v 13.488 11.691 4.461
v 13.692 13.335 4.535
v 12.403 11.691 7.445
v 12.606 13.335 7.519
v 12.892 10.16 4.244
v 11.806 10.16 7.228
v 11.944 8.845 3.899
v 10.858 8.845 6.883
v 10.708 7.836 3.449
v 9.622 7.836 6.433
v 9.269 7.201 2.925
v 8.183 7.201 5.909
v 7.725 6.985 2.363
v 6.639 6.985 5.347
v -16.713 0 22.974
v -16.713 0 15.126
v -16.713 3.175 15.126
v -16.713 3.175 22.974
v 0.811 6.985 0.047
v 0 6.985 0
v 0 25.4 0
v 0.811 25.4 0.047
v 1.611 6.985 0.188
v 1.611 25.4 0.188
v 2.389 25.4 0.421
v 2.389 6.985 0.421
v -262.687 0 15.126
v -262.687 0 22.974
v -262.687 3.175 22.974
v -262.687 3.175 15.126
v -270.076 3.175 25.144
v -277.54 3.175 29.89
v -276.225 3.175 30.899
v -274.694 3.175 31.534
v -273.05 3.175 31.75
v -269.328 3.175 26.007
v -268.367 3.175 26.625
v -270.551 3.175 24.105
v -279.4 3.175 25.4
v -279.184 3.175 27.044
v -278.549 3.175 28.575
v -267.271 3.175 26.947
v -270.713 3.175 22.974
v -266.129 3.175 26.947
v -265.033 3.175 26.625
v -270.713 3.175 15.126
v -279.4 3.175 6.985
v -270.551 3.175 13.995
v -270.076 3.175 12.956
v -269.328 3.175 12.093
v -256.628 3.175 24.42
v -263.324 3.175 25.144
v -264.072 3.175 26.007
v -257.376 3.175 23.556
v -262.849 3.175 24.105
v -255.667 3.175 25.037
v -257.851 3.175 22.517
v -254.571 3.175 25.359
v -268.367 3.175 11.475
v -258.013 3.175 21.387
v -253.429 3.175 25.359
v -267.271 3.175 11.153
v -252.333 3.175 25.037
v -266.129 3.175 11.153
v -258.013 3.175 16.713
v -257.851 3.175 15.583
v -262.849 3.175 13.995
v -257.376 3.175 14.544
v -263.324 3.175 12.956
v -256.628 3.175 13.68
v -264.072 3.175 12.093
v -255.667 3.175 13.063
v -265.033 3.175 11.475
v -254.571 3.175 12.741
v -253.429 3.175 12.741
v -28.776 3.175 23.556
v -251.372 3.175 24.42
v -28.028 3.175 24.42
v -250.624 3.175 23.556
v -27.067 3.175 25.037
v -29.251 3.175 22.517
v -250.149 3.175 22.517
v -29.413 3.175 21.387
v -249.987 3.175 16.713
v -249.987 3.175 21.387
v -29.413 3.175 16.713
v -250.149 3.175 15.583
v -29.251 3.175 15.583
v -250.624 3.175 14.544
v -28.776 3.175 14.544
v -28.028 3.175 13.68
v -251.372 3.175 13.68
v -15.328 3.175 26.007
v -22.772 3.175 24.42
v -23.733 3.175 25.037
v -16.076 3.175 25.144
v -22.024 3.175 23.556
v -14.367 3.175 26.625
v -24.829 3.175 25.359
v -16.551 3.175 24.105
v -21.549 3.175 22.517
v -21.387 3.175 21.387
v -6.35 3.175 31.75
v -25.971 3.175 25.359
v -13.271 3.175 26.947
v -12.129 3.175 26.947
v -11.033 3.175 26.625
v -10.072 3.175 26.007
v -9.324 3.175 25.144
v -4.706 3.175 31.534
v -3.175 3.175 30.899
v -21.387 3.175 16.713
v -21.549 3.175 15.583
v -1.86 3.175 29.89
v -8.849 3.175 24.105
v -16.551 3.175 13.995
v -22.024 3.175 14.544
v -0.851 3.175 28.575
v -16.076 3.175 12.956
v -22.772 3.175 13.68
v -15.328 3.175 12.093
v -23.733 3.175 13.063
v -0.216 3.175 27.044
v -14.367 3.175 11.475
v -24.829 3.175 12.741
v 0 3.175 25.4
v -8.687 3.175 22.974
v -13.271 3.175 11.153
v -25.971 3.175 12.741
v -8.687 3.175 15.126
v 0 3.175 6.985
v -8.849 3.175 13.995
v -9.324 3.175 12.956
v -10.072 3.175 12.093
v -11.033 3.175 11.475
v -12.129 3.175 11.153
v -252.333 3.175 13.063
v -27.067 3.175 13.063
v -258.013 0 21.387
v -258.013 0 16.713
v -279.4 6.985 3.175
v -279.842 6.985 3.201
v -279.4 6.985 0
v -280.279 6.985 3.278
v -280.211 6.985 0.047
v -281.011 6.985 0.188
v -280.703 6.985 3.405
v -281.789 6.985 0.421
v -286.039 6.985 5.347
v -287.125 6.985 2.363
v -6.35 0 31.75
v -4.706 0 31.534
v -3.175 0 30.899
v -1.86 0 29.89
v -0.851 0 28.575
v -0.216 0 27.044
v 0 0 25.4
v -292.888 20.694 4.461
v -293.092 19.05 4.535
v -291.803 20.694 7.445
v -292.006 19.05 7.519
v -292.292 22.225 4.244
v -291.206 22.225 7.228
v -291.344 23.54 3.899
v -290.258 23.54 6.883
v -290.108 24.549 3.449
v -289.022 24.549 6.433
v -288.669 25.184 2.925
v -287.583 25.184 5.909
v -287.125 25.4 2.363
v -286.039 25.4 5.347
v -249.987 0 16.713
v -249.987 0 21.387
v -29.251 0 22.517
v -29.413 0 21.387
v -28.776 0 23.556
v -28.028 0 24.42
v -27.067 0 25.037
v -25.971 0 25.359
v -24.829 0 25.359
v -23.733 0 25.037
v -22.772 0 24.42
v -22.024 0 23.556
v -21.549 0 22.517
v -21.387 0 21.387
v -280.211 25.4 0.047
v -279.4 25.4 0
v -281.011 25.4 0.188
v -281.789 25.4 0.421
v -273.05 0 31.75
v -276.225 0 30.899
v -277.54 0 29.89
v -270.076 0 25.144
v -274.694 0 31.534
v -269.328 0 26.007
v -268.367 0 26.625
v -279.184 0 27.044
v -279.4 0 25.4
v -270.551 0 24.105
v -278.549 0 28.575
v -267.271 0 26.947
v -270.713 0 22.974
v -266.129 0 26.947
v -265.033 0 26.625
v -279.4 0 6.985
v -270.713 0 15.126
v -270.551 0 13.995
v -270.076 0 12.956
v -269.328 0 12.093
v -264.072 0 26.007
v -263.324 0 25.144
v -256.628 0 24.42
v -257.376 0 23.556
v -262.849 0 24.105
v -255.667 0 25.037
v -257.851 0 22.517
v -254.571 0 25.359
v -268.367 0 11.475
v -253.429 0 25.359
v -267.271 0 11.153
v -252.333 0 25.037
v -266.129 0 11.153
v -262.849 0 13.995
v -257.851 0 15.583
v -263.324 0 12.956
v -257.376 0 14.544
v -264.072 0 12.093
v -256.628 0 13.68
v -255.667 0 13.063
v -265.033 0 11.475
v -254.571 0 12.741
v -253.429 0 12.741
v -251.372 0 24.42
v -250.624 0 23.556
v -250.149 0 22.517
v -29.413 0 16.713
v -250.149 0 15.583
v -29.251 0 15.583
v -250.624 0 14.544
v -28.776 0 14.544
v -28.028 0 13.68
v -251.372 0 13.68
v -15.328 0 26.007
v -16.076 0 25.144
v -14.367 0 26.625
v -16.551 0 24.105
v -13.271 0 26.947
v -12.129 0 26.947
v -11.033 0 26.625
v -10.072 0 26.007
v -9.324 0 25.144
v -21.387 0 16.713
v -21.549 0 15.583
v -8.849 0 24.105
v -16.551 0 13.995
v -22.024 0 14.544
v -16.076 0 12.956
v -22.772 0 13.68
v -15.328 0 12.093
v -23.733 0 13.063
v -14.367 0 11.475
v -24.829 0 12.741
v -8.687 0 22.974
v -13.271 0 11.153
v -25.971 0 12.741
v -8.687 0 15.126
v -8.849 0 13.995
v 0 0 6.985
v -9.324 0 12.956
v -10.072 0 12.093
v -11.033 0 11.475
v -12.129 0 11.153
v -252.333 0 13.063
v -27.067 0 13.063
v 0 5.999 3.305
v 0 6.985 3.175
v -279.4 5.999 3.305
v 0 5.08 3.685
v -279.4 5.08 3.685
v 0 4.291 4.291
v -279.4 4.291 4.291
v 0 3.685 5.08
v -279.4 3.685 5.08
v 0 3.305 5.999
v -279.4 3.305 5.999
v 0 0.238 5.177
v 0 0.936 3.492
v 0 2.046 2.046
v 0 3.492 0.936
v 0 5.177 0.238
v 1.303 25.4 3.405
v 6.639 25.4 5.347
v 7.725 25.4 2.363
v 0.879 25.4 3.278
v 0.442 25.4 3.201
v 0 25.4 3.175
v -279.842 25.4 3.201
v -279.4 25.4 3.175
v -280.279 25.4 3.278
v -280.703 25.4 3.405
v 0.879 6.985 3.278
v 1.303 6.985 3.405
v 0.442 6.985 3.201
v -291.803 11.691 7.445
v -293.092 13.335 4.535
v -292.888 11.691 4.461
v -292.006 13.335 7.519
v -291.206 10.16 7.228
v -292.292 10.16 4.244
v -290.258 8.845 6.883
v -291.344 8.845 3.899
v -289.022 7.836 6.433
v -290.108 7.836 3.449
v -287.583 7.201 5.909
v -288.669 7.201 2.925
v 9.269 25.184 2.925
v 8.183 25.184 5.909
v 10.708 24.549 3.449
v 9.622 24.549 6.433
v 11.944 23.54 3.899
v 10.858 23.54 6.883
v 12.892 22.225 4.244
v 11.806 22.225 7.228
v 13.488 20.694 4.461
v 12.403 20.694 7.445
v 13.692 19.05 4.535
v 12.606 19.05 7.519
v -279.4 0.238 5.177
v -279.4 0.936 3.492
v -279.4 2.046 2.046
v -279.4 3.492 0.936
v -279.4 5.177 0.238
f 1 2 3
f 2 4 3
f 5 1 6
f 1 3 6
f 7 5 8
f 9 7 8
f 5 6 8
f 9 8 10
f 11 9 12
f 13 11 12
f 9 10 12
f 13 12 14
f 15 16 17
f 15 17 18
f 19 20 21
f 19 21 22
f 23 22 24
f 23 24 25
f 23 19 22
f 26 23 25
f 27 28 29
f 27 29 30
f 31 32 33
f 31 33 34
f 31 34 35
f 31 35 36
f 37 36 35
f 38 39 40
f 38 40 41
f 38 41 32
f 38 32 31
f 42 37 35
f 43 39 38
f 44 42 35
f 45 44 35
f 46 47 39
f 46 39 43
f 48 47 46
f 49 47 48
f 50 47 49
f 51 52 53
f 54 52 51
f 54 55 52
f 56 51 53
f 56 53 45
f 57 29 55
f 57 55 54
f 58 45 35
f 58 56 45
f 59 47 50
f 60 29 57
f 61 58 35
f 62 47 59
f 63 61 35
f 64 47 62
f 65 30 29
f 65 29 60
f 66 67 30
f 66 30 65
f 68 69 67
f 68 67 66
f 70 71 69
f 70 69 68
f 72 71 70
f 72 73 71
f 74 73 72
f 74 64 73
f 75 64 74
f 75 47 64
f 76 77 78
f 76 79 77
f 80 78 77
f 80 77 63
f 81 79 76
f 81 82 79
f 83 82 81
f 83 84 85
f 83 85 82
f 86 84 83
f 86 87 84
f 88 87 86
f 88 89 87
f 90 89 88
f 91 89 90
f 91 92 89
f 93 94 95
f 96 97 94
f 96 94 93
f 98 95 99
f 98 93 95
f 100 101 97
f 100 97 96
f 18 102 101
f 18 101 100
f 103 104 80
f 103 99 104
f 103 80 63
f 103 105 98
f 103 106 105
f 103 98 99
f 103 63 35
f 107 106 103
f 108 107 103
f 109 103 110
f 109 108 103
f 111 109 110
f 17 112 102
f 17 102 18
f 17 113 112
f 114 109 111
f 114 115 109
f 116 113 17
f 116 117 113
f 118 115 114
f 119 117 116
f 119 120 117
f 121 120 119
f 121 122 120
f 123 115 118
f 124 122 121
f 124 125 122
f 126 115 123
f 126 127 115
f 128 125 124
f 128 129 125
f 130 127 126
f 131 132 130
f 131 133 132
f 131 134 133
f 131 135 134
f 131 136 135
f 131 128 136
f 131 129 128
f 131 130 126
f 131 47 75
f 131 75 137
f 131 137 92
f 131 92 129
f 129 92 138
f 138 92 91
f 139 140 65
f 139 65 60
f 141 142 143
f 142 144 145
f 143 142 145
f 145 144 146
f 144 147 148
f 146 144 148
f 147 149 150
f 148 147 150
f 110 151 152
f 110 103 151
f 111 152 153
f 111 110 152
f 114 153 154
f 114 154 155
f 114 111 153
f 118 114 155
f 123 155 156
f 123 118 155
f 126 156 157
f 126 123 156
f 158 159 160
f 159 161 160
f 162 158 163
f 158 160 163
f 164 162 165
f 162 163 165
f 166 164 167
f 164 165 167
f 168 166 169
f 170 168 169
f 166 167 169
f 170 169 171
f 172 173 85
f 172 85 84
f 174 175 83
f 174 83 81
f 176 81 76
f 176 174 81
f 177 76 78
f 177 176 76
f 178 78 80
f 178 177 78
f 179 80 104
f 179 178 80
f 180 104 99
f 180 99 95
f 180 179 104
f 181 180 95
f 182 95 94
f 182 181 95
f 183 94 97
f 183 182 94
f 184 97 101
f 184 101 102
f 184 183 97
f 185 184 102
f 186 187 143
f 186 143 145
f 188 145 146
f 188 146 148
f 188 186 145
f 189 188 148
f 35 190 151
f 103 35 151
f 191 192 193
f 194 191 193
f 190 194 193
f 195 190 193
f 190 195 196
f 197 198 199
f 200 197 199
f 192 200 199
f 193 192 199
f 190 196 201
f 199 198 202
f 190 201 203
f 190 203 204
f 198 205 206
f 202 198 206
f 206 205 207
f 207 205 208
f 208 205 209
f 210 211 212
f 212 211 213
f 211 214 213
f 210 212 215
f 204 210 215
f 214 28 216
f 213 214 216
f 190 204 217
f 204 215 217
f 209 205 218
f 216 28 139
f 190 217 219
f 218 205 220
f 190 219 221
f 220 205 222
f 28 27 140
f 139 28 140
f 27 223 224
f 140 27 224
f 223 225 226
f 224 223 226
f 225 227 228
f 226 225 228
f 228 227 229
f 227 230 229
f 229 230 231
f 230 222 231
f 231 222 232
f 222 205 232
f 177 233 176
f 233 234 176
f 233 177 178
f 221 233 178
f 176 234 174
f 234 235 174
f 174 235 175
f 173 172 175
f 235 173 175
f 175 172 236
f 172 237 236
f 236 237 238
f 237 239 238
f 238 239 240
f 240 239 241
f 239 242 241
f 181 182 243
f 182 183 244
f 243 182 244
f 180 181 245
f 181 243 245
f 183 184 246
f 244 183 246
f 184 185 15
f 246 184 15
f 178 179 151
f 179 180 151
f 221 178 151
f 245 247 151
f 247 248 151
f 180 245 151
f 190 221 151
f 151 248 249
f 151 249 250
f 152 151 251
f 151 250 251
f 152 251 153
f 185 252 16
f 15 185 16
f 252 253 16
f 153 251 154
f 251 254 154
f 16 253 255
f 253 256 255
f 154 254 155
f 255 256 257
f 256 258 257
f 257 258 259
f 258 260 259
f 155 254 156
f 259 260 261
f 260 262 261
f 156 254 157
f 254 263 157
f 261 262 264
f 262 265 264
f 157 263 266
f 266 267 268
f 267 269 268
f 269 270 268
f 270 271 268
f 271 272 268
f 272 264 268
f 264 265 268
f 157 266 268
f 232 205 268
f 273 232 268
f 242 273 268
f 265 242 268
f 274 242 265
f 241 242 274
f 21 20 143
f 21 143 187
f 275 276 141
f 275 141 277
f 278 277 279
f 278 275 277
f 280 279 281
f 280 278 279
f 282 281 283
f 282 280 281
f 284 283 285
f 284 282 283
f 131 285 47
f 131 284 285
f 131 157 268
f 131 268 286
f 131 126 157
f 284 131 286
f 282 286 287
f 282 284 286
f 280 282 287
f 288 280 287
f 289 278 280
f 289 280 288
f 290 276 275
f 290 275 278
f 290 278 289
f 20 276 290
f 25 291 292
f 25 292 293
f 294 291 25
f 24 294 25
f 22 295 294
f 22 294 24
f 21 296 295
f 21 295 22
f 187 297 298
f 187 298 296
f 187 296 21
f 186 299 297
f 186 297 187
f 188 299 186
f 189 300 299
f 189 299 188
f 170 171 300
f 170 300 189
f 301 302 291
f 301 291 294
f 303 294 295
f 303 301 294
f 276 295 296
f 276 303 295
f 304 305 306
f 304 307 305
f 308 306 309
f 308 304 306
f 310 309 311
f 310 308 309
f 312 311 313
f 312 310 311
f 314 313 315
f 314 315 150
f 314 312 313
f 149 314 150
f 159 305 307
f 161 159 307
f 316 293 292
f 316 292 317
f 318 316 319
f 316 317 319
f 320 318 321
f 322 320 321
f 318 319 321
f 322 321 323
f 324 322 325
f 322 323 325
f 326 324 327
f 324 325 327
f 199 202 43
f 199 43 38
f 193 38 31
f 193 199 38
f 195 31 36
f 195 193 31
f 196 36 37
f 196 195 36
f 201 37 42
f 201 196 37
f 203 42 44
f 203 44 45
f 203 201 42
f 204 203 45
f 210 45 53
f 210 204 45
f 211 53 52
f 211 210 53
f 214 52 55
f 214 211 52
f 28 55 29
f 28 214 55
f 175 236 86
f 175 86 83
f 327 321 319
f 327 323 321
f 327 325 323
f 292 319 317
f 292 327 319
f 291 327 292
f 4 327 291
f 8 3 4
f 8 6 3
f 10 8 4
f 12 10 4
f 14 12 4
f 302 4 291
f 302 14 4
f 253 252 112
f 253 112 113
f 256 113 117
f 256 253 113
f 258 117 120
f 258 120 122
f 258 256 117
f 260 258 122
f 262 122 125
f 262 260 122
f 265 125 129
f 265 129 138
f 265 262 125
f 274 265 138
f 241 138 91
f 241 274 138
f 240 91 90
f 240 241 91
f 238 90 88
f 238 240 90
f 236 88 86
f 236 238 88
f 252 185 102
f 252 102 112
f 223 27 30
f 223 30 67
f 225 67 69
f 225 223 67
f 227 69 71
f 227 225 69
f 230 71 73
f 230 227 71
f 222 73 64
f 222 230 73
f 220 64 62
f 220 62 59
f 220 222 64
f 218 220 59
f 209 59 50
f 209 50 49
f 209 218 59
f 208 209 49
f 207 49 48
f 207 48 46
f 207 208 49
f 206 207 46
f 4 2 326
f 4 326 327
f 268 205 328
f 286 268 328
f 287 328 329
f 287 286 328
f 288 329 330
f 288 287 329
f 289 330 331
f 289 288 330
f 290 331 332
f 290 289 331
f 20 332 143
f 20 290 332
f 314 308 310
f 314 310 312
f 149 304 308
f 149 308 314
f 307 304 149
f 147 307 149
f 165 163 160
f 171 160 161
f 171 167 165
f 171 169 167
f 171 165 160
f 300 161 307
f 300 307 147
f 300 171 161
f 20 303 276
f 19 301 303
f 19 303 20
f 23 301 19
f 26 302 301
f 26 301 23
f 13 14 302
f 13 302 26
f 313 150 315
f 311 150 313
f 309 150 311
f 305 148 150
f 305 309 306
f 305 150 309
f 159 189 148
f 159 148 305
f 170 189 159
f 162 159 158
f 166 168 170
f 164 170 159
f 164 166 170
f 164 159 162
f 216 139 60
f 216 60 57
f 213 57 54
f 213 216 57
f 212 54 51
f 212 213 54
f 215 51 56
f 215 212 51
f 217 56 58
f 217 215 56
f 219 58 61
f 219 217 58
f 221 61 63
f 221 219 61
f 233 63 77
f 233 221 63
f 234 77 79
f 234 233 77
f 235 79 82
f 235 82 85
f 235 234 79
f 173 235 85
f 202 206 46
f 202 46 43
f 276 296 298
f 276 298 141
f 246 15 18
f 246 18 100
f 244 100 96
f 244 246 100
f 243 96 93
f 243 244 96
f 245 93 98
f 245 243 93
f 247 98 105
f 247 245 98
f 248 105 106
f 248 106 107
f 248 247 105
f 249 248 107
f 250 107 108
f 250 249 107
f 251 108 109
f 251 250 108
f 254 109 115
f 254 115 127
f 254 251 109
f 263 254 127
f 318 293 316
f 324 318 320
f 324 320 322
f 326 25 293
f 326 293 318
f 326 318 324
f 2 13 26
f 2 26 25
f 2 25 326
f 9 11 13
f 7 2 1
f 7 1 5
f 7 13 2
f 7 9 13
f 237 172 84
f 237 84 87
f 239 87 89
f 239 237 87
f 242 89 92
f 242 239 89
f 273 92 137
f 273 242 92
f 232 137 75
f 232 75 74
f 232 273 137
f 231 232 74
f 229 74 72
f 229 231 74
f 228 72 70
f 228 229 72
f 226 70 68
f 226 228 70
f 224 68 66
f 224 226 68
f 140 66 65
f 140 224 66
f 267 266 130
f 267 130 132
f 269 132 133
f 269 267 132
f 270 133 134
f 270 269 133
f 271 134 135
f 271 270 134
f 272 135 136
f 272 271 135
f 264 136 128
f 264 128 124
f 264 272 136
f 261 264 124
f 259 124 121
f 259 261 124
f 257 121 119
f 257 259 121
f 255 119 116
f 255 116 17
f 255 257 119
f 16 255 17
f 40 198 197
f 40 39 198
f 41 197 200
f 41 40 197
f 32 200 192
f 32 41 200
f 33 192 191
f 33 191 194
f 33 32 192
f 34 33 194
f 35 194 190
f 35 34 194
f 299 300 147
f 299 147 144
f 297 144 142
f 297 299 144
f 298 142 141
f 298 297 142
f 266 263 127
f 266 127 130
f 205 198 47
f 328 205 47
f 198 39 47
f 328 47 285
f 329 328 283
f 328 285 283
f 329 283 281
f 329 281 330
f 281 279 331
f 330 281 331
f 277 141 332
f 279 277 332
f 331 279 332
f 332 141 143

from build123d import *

# Parameters (mm, degrees)
SKETCH3_W                    = 279.4
SKETCH3_H                    = 31.75
BASE_FLANGE1_DEPTH           = 3.175
EDGE_FLANGE1_STRIP_W         = 20.32
EDGE_FLANGE1_STRIP_H         = 3.175
EDGE_FLANGE1_STRIP_CUT_DEPTH = 279.4
EDGE_FLANGE1_DEPTH           = 279.4
EDGE_FLANGE2_DEPTH           = 18.415
EDGE_FLANGE3_DEPTH           = 18.415
FILLET1_R                    = 6.35
O_0_316_DIAMETER_SLOT2_DEPTH = 3.175
O_0_316_DIAMETER_SLOT1_DEPTH = 3.175


# Read off the part's stored shape, not the designer's step: O (0.316) Diameter Slot2, O (0.316) Diameter Slot1
# Sheet-metal steps are written as plain solids
with BuildPart() as part:
    # Sketch3 → Base-Flange1 (new body)
    with BuildSketch(Plane(origin=(0, 0, 0), x_dir=(1, 0, 0), z_dir=(0, 1, 0))):
        with Locations((-139.7, -15.875)):
            Rectangle(SKETCH3_W, SKETCH3_H)
    extrude(amount=BASE_FLANGE1_DEPTH)

    # Edge-Flange1 strip (across the edge) → Edge-Flange1 strip cut (cut)
    with BuildSketch(Plane(origin=(0, 3.175, 0), x_dir=(0, 0, 1), z_dir=(-1, 0, 0))):
        with Locations((-3.175, -1.5875)):
            Rectangle(EDGE_FLANGE1_STRIP_W, EDGE_FLANGE1_STRIP_H)
    extrude(amount=EDGE_FLANGE1_STRIP_CUT_DEPTH, mode=Mode.SUBTRACT)

    # Edge-Flange1 section (across the edge) → Edge-Flange1 (add)
    with BuildSketch(Plane(origin=(0, 3.175, 0), x_dir=(0, 0, 1), z_dir=(-1, 0, 0))):
        with BuildLine():
            Line((0, 3.81), (0, 22.225))
            Line((0, 22.225), (3.175, 22.225))
            Line((3.175, 22.225), (3.175, 3.81))
            ThreePointArc((3.175, 3.81), (4.290923164, 1.115923164), (6.985, 0))
            Line((6.985, 0), (6.985, -3.175))
            ThreePointArc((6.985, -3.175), (2.045859133, -1.129140867), (0, 3.81))
        make_face()
    extrude(amount=EDGE_FLANGE1_DEPTH)

    # Edge-Flange2 section (across the edge) → Edge-Flange2 (add)
    with BuildSketch(Plane(origin=(0.671805796, 6.985, 3.175), x_dir=(-0.3420201433256631, 2.7658990361859502e-15, 0.9396926207859105), z_dir=(0, 1, 0))):
        with BuildLine():
            Line((-3.175, 0.671805796), (-3.175, 12.7))
            Line((-3.175, 12.7), (0, 12.7))
            Line((0, 12.7), (0, 0.671805796))
            ThreePointArc((0, 0.671805796), (0.057882461, 0.01020624), (0.229771115, -0.63129095))
            Line((0.229771115, -0.63129095), (-2.753752956, -1.717204905))
            ThreePointArc((-2.753752956, -1.717204905), (-3.068882155, -0.541126725), (-3.175, 0.671805796))
        make_face()
    extrude(amount=EDGE_FLANGE2_DEPTH)

    # Edge-Flange3 section (across the edge) → Edge-Flange3 (add)
    with BuildSketch(Plane(origin=(-280.071805796, 25.4, 3.175), x_dir=(0.3420201433256631, 1.2835487003775482e-15, 0.9396926207859105), z_dir=(0, -1, 0))):
        with BuildLine():
            Line((-3.175, 0.671805796), (-3.175, 12.7))
            Line((-3.175, 12.7), (0, 12.7))
            Line((0, 12.7), (0, 0.671805796))
            ThreePointArc((0, 0.671805796), (0.057882461, 0.01020624), (0.229771115, -0.63129095))
            Line((0.229771115, -0.63129095), (-2.753752956, -1.717204905))
            ThreePointArc((-2.753752956, -1.717204905), (-3.068882155, -0.541126725), (-3.175, 0.671805796))
        make_face()
    extrude(amount=EDGE_FLANGE3_DEPTH)

    # Fillet1
    fillet1_edges = [part.edges().sort_by_distance(p)[0] for p in [
        (13.148859058, 6.985, 6.026893785),
        (13.148859058, 25.4, 6.026893785),
        (-292.548859058, 25.4, 6.026893785),
        (-292.548859058, 6.985, 6.026893785),
        (0, 1.5875, 31.75),
        (-279.4, 1.5875, 31.75),
    ]]
    fillet(fillet1_edges, radius=FILLET1_R)

    # O (0.316) Diameter Slot2 outline → O (0.316) Diameter Slot2 (cut)
    with BuildSketch(Plane(origin=(0, 0, 0), x_dir=(1, 0, 0), z_dir=(0, 1, 0))):
        with BuildLine():
            Line((-29.4132, -16.7132), (-29.4132, -21.3868))
            ThreePointArc((-29.4132, -21.3868), (-25.4, -25.4), (-21.3868, -21.3868))
            Line((-21.3868, -21.3868), (-21.3868, -16.7132))
            ThreePointArc((-21.3868, -16.7132), (-25.4, -12.7), (-29.4132, -16.7132))
        make_face()
        with BuildLine():
            Line((-258.0132, -16.7132), (-258.0132, -21.3868))
            ThreePointArc((-258.0132, -21.3868), (-254, -25.4), (-249.9868, -21.3868))
            Line((-249.9868, -21.3868), (-249.9868, -16.7132))
            ThreePointArc((-249.9868, -16.7132), (-254, -12.7), (-258.0132, -16.7132))
        make_face()
    extrude(amount=O_0_316_DIAMETER_SLOT2_DEPTH, mode=Mode.SUBTRACT)

    # O (0.316) Diameter Slot1 outline → O (0.316) Diameter Slot1 (cut)
    with BuildSketch(Plane(origin=(0, 0, 0), x_dir=(1, 0, 0), z_dir=(0, 1, 0))):
        with BuildLine():
            Line((-16.7132, -15.1257), (-16.7132, -22.9743))
            ThreePointArc((-16.7132, -22.9743), (-12.7, -26.9875), (-8.6868, -22.9743))
            Line((-8.6868, -22.9743), (-8.6868, -15.1257))
            ThreePointArc((-8.6868, -15.1257), (-12.7, -11.1125), (-16.7132, -15.1257))
        make_face()
        with BuildLine():
            Line((-270.7132, -15.1257), (-270.7132, -22.9743))
            ThreePointArc((-270.7132, -22.9743), (-266.7, -26.9875), (-262.6868, -22.9743))
            Line((-262.6868, -22.9743), (-262.6868, -15.1257))
            ThreePointArc((-262.6868, -15.1257), (-266.7, -11.1125), (-270.7132, -15.1257))
        make_face()
    extrude(amount=O_0_316_DIAMETER_SLOT1_DEPTH, mode=Mode.SUBTRACT)


solid = part.part
